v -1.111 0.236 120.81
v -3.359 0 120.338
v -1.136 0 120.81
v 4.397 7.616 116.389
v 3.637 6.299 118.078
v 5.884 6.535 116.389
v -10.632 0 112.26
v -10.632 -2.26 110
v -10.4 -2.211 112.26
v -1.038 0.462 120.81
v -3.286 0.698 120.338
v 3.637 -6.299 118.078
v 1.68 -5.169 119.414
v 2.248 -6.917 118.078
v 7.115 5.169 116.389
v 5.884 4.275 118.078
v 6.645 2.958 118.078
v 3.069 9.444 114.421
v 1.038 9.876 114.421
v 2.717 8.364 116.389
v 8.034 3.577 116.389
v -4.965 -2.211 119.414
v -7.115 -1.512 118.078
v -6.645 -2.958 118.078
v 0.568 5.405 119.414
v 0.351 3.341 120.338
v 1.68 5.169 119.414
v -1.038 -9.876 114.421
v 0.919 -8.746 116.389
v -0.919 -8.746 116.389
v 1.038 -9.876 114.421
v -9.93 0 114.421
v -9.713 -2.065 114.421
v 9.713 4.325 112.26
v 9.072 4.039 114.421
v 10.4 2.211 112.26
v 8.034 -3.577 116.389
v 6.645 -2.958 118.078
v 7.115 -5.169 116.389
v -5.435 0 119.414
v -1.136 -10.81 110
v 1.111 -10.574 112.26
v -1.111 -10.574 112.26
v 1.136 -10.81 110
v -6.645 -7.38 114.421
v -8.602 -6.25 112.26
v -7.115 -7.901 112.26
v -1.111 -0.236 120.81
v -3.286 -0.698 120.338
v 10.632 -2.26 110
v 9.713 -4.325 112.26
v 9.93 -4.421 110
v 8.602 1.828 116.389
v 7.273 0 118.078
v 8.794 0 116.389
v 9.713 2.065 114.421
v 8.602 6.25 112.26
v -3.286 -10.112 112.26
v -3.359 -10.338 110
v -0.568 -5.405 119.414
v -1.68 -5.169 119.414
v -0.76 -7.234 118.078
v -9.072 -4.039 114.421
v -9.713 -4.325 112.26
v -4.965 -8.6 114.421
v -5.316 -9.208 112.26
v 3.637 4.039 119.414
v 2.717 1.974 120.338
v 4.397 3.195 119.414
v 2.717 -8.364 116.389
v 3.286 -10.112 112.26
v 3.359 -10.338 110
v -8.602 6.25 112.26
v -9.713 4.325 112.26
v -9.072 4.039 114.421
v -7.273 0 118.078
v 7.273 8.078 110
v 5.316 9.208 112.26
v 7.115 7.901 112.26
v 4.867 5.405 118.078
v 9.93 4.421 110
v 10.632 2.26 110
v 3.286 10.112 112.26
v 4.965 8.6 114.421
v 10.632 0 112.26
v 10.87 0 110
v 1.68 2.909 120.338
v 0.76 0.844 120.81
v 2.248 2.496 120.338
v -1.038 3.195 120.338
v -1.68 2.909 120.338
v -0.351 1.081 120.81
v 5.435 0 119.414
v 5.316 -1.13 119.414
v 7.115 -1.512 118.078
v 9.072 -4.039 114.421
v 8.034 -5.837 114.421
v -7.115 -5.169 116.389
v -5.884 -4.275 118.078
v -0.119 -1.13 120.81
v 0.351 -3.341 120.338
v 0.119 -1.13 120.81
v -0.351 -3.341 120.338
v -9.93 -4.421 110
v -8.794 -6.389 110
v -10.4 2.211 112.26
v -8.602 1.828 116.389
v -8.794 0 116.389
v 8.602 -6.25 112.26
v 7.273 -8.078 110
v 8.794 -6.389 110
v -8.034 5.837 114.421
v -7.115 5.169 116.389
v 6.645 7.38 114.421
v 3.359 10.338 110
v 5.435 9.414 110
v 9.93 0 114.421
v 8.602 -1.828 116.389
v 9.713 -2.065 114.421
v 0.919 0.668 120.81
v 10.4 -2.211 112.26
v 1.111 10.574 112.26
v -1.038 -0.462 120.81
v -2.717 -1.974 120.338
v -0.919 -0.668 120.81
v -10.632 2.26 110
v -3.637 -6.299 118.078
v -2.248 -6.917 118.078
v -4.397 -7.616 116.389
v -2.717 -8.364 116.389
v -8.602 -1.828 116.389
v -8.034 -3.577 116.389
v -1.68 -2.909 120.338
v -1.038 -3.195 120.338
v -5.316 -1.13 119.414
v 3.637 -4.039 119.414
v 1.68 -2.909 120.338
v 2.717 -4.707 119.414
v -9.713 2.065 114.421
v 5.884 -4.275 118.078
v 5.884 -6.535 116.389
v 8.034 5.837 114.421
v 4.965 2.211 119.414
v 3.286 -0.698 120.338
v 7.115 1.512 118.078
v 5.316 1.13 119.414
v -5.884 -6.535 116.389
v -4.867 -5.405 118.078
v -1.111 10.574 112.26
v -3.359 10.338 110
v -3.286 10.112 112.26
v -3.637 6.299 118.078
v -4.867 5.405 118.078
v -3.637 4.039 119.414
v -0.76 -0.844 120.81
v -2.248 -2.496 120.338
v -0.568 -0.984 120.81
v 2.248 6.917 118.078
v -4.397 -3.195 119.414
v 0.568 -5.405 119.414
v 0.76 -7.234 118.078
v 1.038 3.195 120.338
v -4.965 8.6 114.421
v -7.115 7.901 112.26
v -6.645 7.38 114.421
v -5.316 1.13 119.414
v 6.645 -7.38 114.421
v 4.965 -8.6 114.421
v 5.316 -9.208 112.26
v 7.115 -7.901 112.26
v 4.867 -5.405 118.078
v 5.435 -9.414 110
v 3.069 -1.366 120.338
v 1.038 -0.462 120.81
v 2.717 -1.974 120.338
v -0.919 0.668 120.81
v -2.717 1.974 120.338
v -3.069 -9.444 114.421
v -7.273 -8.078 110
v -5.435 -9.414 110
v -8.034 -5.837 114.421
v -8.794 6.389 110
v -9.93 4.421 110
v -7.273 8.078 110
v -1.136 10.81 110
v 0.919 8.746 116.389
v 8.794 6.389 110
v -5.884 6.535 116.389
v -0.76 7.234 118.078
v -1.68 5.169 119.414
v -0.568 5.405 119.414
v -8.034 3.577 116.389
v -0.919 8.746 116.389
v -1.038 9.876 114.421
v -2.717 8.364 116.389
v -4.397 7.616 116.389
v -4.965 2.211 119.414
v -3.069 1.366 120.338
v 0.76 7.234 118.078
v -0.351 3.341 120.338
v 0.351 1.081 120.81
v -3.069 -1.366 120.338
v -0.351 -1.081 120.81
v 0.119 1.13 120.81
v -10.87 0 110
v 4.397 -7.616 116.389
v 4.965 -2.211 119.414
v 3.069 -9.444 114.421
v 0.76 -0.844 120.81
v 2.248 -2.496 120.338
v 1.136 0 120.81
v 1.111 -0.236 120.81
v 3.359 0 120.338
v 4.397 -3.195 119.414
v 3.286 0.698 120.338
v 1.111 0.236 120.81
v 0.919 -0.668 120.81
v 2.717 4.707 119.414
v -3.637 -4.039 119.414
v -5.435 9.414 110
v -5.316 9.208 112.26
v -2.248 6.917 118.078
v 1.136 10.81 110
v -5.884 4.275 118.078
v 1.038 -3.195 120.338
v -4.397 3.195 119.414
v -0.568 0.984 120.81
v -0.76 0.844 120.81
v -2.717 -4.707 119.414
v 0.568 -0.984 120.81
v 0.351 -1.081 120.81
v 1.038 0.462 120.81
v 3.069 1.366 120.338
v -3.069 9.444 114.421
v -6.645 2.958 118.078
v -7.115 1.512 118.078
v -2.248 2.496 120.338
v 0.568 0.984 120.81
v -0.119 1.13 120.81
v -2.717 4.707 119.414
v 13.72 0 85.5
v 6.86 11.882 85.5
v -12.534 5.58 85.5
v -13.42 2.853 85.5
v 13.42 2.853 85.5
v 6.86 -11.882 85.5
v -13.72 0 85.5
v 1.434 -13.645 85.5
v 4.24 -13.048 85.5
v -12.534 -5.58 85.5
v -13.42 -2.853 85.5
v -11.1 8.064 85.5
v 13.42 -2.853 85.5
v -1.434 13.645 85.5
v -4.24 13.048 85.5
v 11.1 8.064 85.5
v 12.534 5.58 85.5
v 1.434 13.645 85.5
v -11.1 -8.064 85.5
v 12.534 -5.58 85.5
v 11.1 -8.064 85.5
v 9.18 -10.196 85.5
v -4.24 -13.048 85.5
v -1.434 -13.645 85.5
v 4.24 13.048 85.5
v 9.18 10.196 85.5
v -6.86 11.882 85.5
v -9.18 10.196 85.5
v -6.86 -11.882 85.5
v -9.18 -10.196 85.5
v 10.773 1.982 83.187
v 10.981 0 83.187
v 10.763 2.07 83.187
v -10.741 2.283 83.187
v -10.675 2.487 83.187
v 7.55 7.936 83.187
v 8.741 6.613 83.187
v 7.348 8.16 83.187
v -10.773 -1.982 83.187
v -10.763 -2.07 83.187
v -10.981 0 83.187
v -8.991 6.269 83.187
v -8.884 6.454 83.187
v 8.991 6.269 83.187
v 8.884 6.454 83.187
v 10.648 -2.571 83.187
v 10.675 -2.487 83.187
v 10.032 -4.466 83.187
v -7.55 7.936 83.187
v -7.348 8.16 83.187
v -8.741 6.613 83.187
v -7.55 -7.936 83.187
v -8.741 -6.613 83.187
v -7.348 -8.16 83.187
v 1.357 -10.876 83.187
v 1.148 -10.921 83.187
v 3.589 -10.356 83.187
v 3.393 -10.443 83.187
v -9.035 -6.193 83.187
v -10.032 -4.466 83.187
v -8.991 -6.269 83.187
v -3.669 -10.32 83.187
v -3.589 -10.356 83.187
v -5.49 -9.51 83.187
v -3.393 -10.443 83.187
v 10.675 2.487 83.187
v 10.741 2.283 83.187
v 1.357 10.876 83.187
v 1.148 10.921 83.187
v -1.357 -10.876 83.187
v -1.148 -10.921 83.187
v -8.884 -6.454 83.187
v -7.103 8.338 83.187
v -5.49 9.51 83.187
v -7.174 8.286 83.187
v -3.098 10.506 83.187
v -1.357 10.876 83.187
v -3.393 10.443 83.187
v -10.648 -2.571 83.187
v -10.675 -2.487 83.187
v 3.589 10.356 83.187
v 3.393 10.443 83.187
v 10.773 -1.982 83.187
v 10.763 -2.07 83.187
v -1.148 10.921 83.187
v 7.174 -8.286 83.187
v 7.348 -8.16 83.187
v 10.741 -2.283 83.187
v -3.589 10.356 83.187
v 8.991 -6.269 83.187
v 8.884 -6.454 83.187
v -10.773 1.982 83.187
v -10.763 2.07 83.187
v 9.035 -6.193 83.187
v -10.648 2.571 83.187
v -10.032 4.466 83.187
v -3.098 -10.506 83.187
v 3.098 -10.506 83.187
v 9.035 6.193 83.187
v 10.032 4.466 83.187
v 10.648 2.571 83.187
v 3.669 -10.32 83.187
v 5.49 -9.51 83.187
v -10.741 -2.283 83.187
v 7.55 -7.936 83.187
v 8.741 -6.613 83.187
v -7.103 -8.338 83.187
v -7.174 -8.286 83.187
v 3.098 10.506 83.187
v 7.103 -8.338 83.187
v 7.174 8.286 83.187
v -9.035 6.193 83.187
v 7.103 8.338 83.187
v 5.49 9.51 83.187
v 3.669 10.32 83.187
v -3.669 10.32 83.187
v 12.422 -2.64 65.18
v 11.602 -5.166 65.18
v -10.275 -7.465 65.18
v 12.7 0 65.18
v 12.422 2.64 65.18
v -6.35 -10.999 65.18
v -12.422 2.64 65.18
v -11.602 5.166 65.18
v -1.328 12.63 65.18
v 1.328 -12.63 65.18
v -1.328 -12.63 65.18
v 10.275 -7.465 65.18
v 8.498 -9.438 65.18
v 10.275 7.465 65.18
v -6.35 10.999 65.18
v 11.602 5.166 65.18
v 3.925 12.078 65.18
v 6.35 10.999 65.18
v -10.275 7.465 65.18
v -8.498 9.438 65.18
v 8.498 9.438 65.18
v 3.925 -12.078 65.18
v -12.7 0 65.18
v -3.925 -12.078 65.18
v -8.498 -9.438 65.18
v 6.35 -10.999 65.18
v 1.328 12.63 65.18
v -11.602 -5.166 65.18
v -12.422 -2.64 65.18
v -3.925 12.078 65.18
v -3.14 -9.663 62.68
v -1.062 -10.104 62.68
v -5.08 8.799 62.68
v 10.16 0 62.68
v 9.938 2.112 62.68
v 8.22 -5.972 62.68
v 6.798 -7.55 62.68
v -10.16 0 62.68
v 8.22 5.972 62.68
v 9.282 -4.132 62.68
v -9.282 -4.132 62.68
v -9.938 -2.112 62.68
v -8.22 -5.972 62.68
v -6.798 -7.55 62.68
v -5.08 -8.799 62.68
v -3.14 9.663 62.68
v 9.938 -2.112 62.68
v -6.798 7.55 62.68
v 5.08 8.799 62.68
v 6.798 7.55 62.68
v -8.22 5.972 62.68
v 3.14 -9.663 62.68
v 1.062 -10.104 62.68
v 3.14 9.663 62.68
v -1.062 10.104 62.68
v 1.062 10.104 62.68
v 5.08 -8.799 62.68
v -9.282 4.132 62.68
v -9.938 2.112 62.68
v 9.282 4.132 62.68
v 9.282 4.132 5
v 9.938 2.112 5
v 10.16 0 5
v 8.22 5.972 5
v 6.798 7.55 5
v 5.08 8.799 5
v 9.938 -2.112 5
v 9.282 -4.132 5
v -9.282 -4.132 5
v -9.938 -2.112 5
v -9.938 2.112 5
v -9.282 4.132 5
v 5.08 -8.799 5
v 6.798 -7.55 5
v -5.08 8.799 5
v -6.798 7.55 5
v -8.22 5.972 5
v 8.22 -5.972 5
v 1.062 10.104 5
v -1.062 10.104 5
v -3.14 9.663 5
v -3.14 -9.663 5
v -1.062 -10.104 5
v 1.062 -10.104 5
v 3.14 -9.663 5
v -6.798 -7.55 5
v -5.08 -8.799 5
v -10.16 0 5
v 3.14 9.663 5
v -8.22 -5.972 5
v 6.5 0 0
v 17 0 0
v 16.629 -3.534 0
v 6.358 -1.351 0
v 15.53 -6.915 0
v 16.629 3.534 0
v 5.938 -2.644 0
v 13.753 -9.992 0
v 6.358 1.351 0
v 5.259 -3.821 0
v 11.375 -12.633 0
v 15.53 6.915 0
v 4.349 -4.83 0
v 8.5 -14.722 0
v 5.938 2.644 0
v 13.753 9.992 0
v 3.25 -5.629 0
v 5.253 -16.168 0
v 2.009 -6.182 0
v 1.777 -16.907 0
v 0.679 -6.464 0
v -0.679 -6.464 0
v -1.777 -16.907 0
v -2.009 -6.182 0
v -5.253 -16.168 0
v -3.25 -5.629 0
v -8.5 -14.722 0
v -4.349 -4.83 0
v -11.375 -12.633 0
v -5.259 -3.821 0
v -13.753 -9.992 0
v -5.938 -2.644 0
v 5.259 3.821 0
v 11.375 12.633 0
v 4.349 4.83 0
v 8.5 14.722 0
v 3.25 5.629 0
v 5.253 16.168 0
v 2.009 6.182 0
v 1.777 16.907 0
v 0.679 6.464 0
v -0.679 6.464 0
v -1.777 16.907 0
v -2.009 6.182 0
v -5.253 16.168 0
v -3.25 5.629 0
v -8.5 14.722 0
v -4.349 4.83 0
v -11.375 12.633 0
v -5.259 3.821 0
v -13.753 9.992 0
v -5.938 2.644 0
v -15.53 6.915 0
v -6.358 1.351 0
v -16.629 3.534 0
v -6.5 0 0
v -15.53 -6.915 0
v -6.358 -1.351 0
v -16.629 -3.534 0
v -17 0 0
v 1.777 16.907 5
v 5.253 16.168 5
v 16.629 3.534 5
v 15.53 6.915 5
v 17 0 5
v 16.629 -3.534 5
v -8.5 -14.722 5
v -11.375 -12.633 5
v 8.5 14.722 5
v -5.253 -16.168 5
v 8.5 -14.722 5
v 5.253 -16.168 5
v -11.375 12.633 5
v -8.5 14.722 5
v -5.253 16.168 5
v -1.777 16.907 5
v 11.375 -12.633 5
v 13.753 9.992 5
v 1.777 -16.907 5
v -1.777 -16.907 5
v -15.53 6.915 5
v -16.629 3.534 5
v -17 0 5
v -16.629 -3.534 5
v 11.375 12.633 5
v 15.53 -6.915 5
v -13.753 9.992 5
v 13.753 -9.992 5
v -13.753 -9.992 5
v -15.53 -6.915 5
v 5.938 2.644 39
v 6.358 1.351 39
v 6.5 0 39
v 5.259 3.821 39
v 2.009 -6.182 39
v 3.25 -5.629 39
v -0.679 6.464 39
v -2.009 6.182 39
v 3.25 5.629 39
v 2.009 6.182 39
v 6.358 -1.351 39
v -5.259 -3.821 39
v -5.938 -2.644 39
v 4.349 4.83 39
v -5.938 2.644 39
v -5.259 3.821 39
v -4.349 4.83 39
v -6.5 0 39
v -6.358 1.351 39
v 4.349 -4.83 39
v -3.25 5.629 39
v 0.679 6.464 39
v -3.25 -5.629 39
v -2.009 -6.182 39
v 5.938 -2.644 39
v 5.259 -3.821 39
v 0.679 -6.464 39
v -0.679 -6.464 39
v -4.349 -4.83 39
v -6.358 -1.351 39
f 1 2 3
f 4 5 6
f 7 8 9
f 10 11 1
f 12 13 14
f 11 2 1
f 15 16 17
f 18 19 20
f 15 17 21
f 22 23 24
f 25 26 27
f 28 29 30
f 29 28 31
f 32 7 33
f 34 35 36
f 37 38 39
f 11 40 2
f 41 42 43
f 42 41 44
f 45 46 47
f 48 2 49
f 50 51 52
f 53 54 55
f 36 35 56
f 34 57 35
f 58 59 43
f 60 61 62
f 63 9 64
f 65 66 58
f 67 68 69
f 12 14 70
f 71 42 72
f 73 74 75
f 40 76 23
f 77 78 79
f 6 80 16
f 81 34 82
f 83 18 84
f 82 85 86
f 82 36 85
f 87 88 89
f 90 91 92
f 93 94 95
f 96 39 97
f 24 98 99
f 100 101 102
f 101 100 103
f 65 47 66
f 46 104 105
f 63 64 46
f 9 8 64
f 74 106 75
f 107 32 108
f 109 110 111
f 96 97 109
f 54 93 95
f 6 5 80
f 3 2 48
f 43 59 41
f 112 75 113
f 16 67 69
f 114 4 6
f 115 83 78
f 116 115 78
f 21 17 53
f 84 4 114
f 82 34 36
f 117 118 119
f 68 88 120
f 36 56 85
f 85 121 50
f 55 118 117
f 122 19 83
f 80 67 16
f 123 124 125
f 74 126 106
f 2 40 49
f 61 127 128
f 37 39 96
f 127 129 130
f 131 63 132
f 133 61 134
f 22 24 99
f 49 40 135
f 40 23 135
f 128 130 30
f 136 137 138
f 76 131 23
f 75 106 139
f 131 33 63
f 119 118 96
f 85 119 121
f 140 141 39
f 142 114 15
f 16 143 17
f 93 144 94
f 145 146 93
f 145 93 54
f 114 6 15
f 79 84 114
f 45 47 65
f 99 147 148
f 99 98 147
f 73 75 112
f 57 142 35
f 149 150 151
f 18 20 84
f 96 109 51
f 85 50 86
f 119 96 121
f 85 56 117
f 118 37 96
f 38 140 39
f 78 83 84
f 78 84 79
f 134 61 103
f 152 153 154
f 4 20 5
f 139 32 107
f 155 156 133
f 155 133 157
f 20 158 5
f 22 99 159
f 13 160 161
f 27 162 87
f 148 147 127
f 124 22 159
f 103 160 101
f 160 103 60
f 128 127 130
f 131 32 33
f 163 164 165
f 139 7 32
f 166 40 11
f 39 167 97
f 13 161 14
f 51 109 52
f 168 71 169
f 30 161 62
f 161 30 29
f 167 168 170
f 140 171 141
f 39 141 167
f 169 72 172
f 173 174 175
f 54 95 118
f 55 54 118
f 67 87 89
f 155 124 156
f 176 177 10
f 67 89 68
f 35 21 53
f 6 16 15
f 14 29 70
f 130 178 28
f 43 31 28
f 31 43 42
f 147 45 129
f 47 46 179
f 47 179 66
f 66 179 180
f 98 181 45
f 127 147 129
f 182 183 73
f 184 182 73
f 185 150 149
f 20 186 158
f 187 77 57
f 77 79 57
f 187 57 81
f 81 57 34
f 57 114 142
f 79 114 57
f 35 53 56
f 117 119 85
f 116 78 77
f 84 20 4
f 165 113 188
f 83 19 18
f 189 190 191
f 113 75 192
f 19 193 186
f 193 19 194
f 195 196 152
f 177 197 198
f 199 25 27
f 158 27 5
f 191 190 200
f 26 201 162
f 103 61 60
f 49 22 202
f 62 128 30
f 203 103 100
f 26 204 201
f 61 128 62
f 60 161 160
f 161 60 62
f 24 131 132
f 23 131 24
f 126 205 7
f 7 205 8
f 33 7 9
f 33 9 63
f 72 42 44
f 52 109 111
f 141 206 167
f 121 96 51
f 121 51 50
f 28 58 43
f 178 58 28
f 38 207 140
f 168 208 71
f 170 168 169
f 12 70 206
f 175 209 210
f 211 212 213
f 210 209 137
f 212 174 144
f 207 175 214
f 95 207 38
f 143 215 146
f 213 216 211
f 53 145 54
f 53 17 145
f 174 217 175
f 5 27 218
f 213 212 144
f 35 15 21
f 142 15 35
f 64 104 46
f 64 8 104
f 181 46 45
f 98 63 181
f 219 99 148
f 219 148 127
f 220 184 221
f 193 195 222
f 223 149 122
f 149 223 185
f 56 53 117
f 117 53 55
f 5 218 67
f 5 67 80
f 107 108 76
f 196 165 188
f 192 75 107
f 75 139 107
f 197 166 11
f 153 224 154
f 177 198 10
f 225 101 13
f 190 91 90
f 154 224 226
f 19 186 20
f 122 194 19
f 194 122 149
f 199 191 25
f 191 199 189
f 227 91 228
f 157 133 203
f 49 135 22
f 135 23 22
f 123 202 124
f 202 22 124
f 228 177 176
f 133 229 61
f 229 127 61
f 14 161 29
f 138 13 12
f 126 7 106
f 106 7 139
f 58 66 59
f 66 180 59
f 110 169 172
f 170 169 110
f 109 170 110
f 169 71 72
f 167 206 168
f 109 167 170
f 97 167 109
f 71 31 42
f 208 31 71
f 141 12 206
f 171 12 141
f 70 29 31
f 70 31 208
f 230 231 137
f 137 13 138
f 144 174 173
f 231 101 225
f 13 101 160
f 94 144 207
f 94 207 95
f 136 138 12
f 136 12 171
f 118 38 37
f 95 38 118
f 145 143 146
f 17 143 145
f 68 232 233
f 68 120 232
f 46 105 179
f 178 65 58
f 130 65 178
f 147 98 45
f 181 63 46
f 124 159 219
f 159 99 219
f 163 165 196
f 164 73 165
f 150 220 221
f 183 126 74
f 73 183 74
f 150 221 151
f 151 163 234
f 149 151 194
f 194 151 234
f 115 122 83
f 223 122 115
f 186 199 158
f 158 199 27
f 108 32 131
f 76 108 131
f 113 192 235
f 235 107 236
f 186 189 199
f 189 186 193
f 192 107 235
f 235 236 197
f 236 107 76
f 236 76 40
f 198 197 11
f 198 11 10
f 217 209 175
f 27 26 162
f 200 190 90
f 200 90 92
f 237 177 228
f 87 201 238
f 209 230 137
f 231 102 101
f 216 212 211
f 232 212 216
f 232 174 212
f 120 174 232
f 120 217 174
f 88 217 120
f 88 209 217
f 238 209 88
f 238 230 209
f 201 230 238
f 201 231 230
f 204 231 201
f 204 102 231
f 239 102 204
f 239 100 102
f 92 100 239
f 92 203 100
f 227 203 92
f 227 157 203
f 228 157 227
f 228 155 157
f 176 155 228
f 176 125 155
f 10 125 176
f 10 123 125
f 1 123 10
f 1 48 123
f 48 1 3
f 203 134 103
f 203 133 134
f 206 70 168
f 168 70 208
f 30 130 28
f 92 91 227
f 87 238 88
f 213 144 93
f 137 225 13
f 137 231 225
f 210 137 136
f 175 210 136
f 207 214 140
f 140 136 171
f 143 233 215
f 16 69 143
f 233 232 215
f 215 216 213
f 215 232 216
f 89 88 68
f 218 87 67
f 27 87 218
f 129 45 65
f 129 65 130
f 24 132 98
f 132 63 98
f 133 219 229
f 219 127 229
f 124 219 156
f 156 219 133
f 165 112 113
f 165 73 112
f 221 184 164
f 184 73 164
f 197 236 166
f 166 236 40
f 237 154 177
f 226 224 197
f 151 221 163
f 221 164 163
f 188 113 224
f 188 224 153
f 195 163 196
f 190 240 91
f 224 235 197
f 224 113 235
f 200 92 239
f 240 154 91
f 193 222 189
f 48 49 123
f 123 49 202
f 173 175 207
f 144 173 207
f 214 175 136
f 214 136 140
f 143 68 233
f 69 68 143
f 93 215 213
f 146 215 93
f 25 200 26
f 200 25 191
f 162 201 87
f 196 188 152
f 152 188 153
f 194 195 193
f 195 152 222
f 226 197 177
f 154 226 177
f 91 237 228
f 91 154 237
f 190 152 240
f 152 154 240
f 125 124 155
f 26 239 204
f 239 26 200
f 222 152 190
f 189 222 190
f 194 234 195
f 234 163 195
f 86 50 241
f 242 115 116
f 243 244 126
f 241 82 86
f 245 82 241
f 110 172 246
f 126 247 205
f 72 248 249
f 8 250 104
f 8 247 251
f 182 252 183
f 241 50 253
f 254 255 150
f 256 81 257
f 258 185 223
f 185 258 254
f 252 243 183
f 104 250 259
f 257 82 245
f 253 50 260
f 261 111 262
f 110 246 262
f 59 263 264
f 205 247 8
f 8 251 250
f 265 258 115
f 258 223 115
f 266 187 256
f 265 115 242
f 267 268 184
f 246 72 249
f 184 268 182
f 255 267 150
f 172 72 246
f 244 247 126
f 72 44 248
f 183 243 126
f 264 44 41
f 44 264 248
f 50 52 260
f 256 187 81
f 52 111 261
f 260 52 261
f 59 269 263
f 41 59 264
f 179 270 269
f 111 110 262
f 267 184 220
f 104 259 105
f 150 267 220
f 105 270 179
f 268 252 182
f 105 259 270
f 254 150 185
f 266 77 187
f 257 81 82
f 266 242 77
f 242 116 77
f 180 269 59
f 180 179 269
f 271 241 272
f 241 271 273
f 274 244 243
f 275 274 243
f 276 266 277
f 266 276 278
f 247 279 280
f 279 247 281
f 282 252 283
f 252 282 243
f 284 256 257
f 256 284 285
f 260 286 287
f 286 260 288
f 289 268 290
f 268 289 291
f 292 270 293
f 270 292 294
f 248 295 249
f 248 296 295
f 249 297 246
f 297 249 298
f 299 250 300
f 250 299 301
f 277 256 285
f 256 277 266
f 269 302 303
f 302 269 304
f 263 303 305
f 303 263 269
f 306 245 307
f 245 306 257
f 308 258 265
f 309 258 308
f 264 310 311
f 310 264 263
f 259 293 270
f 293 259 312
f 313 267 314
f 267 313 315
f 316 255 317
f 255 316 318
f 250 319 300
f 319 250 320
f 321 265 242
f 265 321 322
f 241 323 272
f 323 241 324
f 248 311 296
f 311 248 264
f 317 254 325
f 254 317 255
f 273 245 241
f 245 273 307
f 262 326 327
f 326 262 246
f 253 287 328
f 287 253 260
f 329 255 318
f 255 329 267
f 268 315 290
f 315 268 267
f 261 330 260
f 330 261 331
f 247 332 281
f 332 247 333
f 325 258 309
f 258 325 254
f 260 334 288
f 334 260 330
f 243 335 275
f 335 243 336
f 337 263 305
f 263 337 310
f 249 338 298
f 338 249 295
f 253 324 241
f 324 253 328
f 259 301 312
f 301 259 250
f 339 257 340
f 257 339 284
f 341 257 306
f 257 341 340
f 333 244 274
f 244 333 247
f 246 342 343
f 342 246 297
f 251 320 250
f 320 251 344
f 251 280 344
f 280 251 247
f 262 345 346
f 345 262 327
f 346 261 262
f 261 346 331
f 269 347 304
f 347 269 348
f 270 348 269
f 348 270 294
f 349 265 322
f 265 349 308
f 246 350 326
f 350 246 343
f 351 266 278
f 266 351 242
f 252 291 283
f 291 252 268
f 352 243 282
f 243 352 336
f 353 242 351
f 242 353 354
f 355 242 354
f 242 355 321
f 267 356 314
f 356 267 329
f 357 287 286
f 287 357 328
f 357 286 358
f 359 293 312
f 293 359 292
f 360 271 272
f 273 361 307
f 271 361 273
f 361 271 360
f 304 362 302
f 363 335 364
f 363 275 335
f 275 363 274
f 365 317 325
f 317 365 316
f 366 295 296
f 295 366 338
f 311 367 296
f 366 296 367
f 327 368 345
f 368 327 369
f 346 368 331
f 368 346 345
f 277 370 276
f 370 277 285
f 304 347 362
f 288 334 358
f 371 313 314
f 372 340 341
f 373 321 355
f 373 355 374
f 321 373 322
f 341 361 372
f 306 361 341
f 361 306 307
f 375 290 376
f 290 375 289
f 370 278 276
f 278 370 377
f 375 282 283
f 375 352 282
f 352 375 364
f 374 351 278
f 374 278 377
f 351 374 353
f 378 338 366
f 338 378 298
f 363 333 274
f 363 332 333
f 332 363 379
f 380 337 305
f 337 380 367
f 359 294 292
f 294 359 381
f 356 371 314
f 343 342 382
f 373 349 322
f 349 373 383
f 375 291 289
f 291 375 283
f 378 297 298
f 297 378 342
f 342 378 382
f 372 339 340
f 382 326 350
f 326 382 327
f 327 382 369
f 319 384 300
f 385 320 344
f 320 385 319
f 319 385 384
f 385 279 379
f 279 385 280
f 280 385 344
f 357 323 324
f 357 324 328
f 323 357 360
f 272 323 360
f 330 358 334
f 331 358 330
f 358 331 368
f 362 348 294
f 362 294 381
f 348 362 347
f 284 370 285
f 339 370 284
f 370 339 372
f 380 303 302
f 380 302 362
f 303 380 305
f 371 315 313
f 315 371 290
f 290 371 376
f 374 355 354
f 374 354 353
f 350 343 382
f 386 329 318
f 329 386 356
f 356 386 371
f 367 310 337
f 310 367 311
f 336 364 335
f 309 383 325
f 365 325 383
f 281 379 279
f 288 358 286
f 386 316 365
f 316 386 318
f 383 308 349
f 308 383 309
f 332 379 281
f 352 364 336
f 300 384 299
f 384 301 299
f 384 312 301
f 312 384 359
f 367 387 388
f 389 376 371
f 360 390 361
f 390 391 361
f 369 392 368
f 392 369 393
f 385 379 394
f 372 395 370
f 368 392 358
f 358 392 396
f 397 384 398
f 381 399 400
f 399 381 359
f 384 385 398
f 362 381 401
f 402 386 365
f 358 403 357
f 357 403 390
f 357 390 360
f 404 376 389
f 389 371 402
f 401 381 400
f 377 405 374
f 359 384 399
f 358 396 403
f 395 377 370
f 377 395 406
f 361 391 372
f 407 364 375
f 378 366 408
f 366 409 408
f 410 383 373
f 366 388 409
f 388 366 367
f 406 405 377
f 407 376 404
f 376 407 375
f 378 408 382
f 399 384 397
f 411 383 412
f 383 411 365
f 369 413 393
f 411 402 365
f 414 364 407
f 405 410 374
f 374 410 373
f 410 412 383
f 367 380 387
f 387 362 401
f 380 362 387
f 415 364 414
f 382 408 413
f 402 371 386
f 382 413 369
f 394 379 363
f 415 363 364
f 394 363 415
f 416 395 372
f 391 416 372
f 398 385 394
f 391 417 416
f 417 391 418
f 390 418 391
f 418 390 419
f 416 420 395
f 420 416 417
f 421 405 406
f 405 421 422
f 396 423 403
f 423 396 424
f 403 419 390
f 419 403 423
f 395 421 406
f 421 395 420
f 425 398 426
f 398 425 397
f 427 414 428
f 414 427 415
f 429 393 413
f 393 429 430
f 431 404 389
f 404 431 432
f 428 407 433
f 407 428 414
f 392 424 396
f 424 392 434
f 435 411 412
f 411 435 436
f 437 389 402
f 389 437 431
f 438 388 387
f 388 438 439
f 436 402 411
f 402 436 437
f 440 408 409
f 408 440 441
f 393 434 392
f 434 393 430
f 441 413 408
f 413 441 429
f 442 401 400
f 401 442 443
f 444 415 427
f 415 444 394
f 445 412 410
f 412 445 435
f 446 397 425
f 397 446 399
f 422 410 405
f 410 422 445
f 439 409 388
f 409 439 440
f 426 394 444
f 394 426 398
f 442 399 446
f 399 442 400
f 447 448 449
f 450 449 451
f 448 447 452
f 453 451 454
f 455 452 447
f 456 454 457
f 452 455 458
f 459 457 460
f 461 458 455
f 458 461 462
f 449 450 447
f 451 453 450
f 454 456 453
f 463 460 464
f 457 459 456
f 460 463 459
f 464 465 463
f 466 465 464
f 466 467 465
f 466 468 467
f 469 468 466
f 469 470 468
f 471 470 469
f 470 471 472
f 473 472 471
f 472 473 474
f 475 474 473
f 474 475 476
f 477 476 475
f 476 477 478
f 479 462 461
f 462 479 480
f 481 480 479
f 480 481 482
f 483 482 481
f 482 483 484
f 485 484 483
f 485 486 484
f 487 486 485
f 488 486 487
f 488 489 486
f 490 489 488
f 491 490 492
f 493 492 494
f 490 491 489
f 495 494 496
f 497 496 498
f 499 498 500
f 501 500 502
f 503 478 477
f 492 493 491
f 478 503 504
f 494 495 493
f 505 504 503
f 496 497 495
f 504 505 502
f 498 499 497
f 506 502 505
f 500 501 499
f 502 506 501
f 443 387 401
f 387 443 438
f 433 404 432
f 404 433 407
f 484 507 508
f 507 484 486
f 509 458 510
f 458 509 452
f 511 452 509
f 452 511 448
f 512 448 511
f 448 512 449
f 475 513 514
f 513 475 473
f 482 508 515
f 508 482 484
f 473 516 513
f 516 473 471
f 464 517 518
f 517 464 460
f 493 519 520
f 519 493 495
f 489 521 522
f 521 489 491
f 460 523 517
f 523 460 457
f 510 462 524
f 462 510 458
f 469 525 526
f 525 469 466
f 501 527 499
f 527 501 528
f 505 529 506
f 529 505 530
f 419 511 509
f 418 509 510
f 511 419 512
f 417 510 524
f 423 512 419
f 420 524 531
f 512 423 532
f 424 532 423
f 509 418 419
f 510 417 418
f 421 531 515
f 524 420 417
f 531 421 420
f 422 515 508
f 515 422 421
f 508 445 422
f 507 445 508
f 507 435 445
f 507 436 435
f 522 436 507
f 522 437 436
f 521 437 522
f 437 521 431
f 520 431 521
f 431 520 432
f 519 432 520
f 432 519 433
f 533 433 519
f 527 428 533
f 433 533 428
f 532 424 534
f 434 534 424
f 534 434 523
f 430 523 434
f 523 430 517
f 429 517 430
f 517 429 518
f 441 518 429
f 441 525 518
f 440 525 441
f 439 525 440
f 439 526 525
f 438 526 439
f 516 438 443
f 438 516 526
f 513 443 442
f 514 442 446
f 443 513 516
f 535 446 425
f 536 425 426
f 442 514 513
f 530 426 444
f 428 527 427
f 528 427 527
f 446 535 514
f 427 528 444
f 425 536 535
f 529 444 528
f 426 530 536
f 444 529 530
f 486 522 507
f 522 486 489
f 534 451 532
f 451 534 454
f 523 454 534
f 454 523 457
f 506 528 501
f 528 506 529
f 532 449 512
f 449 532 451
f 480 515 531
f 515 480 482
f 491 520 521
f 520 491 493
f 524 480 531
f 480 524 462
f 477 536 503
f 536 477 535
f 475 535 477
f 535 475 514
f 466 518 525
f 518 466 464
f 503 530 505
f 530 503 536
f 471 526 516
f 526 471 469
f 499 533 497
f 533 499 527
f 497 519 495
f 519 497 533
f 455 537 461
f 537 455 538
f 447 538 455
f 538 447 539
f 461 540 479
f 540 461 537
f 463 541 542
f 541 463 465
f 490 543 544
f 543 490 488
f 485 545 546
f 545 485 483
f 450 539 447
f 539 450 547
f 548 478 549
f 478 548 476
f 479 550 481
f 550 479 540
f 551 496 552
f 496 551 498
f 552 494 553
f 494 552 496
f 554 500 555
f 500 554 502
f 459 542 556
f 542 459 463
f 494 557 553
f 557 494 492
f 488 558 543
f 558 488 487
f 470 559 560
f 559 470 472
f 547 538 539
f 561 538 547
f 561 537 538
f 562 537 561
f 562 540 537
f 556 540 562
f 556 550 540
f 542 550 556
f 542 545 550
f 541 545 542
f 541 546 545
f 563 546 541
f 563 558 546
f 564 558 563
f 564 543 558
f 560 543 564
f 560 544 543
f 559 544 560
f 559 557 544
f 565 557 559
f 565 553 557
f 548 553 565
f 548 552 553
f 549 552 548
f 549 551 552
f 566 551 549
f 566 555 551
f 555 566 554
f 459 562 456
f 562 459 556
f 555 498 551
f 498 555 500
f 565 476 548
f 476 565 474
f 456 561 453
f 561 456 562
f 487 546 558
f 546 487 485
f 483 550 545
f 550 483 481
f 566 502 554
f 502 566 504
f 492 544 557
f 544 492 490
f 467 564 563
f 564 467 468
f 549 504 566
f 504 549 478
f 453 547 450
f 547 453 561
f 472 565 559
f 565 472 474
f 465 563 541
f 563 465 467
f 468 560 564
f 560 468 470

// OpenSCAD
/* Description:

This is a 3D OpenSCAD copy of the Dr Johnson Vac-U-Lock system.

There is full details at <http://adultblogz.co.uk/Vac-U-Lock>
*/

Shaft = 110;		// Length;  min = 70
RodDia = 25.4 / 2 + 0.3;
RodHt = 40;
$fn = 30;
BevelHt = 2.5;  // 3 is about 45 degrees

module vac_u_lock()
{
    	union()
	{
		// The Top bit
		translate([0,0,Shaft])
		sphere(r = 10.87);

		// First Overhang
		translate([0,0,Shaft-24.5])
		cylinder(h = 24.5, r1 = 13.72, r2 = 10.87);

        // bevel
		translate([0,0,Shaft-24.5-BevelHt])
		cylinder(h = BevelHt, r1 = 10.76, r2 = 13.72);
        
		// Second Overhang
		translate([0,0,Shaft-24.5-20.32])
		cylinder(h = 20.32, r1 = 12.7, r2 = 10.76);		
		
        // bevel
		translate([0,0,Shaft-24.5-20.32-BevelHt])
		cylinder(h = BevelHt, r1 = 10.16, r2 = 12.7);
        
		// Shaft
		cylinder(h = Shaft, r = 10.16);	
	}
}

difference()
{
    union() {
        vac_u_lock(); 
        // bottom plate for adhesion
        cylinder(h = 5, r = 17);
    }
    translate([0,0,-1])
        cylinder(r=RodDia/2, h=RodHt);
 }
